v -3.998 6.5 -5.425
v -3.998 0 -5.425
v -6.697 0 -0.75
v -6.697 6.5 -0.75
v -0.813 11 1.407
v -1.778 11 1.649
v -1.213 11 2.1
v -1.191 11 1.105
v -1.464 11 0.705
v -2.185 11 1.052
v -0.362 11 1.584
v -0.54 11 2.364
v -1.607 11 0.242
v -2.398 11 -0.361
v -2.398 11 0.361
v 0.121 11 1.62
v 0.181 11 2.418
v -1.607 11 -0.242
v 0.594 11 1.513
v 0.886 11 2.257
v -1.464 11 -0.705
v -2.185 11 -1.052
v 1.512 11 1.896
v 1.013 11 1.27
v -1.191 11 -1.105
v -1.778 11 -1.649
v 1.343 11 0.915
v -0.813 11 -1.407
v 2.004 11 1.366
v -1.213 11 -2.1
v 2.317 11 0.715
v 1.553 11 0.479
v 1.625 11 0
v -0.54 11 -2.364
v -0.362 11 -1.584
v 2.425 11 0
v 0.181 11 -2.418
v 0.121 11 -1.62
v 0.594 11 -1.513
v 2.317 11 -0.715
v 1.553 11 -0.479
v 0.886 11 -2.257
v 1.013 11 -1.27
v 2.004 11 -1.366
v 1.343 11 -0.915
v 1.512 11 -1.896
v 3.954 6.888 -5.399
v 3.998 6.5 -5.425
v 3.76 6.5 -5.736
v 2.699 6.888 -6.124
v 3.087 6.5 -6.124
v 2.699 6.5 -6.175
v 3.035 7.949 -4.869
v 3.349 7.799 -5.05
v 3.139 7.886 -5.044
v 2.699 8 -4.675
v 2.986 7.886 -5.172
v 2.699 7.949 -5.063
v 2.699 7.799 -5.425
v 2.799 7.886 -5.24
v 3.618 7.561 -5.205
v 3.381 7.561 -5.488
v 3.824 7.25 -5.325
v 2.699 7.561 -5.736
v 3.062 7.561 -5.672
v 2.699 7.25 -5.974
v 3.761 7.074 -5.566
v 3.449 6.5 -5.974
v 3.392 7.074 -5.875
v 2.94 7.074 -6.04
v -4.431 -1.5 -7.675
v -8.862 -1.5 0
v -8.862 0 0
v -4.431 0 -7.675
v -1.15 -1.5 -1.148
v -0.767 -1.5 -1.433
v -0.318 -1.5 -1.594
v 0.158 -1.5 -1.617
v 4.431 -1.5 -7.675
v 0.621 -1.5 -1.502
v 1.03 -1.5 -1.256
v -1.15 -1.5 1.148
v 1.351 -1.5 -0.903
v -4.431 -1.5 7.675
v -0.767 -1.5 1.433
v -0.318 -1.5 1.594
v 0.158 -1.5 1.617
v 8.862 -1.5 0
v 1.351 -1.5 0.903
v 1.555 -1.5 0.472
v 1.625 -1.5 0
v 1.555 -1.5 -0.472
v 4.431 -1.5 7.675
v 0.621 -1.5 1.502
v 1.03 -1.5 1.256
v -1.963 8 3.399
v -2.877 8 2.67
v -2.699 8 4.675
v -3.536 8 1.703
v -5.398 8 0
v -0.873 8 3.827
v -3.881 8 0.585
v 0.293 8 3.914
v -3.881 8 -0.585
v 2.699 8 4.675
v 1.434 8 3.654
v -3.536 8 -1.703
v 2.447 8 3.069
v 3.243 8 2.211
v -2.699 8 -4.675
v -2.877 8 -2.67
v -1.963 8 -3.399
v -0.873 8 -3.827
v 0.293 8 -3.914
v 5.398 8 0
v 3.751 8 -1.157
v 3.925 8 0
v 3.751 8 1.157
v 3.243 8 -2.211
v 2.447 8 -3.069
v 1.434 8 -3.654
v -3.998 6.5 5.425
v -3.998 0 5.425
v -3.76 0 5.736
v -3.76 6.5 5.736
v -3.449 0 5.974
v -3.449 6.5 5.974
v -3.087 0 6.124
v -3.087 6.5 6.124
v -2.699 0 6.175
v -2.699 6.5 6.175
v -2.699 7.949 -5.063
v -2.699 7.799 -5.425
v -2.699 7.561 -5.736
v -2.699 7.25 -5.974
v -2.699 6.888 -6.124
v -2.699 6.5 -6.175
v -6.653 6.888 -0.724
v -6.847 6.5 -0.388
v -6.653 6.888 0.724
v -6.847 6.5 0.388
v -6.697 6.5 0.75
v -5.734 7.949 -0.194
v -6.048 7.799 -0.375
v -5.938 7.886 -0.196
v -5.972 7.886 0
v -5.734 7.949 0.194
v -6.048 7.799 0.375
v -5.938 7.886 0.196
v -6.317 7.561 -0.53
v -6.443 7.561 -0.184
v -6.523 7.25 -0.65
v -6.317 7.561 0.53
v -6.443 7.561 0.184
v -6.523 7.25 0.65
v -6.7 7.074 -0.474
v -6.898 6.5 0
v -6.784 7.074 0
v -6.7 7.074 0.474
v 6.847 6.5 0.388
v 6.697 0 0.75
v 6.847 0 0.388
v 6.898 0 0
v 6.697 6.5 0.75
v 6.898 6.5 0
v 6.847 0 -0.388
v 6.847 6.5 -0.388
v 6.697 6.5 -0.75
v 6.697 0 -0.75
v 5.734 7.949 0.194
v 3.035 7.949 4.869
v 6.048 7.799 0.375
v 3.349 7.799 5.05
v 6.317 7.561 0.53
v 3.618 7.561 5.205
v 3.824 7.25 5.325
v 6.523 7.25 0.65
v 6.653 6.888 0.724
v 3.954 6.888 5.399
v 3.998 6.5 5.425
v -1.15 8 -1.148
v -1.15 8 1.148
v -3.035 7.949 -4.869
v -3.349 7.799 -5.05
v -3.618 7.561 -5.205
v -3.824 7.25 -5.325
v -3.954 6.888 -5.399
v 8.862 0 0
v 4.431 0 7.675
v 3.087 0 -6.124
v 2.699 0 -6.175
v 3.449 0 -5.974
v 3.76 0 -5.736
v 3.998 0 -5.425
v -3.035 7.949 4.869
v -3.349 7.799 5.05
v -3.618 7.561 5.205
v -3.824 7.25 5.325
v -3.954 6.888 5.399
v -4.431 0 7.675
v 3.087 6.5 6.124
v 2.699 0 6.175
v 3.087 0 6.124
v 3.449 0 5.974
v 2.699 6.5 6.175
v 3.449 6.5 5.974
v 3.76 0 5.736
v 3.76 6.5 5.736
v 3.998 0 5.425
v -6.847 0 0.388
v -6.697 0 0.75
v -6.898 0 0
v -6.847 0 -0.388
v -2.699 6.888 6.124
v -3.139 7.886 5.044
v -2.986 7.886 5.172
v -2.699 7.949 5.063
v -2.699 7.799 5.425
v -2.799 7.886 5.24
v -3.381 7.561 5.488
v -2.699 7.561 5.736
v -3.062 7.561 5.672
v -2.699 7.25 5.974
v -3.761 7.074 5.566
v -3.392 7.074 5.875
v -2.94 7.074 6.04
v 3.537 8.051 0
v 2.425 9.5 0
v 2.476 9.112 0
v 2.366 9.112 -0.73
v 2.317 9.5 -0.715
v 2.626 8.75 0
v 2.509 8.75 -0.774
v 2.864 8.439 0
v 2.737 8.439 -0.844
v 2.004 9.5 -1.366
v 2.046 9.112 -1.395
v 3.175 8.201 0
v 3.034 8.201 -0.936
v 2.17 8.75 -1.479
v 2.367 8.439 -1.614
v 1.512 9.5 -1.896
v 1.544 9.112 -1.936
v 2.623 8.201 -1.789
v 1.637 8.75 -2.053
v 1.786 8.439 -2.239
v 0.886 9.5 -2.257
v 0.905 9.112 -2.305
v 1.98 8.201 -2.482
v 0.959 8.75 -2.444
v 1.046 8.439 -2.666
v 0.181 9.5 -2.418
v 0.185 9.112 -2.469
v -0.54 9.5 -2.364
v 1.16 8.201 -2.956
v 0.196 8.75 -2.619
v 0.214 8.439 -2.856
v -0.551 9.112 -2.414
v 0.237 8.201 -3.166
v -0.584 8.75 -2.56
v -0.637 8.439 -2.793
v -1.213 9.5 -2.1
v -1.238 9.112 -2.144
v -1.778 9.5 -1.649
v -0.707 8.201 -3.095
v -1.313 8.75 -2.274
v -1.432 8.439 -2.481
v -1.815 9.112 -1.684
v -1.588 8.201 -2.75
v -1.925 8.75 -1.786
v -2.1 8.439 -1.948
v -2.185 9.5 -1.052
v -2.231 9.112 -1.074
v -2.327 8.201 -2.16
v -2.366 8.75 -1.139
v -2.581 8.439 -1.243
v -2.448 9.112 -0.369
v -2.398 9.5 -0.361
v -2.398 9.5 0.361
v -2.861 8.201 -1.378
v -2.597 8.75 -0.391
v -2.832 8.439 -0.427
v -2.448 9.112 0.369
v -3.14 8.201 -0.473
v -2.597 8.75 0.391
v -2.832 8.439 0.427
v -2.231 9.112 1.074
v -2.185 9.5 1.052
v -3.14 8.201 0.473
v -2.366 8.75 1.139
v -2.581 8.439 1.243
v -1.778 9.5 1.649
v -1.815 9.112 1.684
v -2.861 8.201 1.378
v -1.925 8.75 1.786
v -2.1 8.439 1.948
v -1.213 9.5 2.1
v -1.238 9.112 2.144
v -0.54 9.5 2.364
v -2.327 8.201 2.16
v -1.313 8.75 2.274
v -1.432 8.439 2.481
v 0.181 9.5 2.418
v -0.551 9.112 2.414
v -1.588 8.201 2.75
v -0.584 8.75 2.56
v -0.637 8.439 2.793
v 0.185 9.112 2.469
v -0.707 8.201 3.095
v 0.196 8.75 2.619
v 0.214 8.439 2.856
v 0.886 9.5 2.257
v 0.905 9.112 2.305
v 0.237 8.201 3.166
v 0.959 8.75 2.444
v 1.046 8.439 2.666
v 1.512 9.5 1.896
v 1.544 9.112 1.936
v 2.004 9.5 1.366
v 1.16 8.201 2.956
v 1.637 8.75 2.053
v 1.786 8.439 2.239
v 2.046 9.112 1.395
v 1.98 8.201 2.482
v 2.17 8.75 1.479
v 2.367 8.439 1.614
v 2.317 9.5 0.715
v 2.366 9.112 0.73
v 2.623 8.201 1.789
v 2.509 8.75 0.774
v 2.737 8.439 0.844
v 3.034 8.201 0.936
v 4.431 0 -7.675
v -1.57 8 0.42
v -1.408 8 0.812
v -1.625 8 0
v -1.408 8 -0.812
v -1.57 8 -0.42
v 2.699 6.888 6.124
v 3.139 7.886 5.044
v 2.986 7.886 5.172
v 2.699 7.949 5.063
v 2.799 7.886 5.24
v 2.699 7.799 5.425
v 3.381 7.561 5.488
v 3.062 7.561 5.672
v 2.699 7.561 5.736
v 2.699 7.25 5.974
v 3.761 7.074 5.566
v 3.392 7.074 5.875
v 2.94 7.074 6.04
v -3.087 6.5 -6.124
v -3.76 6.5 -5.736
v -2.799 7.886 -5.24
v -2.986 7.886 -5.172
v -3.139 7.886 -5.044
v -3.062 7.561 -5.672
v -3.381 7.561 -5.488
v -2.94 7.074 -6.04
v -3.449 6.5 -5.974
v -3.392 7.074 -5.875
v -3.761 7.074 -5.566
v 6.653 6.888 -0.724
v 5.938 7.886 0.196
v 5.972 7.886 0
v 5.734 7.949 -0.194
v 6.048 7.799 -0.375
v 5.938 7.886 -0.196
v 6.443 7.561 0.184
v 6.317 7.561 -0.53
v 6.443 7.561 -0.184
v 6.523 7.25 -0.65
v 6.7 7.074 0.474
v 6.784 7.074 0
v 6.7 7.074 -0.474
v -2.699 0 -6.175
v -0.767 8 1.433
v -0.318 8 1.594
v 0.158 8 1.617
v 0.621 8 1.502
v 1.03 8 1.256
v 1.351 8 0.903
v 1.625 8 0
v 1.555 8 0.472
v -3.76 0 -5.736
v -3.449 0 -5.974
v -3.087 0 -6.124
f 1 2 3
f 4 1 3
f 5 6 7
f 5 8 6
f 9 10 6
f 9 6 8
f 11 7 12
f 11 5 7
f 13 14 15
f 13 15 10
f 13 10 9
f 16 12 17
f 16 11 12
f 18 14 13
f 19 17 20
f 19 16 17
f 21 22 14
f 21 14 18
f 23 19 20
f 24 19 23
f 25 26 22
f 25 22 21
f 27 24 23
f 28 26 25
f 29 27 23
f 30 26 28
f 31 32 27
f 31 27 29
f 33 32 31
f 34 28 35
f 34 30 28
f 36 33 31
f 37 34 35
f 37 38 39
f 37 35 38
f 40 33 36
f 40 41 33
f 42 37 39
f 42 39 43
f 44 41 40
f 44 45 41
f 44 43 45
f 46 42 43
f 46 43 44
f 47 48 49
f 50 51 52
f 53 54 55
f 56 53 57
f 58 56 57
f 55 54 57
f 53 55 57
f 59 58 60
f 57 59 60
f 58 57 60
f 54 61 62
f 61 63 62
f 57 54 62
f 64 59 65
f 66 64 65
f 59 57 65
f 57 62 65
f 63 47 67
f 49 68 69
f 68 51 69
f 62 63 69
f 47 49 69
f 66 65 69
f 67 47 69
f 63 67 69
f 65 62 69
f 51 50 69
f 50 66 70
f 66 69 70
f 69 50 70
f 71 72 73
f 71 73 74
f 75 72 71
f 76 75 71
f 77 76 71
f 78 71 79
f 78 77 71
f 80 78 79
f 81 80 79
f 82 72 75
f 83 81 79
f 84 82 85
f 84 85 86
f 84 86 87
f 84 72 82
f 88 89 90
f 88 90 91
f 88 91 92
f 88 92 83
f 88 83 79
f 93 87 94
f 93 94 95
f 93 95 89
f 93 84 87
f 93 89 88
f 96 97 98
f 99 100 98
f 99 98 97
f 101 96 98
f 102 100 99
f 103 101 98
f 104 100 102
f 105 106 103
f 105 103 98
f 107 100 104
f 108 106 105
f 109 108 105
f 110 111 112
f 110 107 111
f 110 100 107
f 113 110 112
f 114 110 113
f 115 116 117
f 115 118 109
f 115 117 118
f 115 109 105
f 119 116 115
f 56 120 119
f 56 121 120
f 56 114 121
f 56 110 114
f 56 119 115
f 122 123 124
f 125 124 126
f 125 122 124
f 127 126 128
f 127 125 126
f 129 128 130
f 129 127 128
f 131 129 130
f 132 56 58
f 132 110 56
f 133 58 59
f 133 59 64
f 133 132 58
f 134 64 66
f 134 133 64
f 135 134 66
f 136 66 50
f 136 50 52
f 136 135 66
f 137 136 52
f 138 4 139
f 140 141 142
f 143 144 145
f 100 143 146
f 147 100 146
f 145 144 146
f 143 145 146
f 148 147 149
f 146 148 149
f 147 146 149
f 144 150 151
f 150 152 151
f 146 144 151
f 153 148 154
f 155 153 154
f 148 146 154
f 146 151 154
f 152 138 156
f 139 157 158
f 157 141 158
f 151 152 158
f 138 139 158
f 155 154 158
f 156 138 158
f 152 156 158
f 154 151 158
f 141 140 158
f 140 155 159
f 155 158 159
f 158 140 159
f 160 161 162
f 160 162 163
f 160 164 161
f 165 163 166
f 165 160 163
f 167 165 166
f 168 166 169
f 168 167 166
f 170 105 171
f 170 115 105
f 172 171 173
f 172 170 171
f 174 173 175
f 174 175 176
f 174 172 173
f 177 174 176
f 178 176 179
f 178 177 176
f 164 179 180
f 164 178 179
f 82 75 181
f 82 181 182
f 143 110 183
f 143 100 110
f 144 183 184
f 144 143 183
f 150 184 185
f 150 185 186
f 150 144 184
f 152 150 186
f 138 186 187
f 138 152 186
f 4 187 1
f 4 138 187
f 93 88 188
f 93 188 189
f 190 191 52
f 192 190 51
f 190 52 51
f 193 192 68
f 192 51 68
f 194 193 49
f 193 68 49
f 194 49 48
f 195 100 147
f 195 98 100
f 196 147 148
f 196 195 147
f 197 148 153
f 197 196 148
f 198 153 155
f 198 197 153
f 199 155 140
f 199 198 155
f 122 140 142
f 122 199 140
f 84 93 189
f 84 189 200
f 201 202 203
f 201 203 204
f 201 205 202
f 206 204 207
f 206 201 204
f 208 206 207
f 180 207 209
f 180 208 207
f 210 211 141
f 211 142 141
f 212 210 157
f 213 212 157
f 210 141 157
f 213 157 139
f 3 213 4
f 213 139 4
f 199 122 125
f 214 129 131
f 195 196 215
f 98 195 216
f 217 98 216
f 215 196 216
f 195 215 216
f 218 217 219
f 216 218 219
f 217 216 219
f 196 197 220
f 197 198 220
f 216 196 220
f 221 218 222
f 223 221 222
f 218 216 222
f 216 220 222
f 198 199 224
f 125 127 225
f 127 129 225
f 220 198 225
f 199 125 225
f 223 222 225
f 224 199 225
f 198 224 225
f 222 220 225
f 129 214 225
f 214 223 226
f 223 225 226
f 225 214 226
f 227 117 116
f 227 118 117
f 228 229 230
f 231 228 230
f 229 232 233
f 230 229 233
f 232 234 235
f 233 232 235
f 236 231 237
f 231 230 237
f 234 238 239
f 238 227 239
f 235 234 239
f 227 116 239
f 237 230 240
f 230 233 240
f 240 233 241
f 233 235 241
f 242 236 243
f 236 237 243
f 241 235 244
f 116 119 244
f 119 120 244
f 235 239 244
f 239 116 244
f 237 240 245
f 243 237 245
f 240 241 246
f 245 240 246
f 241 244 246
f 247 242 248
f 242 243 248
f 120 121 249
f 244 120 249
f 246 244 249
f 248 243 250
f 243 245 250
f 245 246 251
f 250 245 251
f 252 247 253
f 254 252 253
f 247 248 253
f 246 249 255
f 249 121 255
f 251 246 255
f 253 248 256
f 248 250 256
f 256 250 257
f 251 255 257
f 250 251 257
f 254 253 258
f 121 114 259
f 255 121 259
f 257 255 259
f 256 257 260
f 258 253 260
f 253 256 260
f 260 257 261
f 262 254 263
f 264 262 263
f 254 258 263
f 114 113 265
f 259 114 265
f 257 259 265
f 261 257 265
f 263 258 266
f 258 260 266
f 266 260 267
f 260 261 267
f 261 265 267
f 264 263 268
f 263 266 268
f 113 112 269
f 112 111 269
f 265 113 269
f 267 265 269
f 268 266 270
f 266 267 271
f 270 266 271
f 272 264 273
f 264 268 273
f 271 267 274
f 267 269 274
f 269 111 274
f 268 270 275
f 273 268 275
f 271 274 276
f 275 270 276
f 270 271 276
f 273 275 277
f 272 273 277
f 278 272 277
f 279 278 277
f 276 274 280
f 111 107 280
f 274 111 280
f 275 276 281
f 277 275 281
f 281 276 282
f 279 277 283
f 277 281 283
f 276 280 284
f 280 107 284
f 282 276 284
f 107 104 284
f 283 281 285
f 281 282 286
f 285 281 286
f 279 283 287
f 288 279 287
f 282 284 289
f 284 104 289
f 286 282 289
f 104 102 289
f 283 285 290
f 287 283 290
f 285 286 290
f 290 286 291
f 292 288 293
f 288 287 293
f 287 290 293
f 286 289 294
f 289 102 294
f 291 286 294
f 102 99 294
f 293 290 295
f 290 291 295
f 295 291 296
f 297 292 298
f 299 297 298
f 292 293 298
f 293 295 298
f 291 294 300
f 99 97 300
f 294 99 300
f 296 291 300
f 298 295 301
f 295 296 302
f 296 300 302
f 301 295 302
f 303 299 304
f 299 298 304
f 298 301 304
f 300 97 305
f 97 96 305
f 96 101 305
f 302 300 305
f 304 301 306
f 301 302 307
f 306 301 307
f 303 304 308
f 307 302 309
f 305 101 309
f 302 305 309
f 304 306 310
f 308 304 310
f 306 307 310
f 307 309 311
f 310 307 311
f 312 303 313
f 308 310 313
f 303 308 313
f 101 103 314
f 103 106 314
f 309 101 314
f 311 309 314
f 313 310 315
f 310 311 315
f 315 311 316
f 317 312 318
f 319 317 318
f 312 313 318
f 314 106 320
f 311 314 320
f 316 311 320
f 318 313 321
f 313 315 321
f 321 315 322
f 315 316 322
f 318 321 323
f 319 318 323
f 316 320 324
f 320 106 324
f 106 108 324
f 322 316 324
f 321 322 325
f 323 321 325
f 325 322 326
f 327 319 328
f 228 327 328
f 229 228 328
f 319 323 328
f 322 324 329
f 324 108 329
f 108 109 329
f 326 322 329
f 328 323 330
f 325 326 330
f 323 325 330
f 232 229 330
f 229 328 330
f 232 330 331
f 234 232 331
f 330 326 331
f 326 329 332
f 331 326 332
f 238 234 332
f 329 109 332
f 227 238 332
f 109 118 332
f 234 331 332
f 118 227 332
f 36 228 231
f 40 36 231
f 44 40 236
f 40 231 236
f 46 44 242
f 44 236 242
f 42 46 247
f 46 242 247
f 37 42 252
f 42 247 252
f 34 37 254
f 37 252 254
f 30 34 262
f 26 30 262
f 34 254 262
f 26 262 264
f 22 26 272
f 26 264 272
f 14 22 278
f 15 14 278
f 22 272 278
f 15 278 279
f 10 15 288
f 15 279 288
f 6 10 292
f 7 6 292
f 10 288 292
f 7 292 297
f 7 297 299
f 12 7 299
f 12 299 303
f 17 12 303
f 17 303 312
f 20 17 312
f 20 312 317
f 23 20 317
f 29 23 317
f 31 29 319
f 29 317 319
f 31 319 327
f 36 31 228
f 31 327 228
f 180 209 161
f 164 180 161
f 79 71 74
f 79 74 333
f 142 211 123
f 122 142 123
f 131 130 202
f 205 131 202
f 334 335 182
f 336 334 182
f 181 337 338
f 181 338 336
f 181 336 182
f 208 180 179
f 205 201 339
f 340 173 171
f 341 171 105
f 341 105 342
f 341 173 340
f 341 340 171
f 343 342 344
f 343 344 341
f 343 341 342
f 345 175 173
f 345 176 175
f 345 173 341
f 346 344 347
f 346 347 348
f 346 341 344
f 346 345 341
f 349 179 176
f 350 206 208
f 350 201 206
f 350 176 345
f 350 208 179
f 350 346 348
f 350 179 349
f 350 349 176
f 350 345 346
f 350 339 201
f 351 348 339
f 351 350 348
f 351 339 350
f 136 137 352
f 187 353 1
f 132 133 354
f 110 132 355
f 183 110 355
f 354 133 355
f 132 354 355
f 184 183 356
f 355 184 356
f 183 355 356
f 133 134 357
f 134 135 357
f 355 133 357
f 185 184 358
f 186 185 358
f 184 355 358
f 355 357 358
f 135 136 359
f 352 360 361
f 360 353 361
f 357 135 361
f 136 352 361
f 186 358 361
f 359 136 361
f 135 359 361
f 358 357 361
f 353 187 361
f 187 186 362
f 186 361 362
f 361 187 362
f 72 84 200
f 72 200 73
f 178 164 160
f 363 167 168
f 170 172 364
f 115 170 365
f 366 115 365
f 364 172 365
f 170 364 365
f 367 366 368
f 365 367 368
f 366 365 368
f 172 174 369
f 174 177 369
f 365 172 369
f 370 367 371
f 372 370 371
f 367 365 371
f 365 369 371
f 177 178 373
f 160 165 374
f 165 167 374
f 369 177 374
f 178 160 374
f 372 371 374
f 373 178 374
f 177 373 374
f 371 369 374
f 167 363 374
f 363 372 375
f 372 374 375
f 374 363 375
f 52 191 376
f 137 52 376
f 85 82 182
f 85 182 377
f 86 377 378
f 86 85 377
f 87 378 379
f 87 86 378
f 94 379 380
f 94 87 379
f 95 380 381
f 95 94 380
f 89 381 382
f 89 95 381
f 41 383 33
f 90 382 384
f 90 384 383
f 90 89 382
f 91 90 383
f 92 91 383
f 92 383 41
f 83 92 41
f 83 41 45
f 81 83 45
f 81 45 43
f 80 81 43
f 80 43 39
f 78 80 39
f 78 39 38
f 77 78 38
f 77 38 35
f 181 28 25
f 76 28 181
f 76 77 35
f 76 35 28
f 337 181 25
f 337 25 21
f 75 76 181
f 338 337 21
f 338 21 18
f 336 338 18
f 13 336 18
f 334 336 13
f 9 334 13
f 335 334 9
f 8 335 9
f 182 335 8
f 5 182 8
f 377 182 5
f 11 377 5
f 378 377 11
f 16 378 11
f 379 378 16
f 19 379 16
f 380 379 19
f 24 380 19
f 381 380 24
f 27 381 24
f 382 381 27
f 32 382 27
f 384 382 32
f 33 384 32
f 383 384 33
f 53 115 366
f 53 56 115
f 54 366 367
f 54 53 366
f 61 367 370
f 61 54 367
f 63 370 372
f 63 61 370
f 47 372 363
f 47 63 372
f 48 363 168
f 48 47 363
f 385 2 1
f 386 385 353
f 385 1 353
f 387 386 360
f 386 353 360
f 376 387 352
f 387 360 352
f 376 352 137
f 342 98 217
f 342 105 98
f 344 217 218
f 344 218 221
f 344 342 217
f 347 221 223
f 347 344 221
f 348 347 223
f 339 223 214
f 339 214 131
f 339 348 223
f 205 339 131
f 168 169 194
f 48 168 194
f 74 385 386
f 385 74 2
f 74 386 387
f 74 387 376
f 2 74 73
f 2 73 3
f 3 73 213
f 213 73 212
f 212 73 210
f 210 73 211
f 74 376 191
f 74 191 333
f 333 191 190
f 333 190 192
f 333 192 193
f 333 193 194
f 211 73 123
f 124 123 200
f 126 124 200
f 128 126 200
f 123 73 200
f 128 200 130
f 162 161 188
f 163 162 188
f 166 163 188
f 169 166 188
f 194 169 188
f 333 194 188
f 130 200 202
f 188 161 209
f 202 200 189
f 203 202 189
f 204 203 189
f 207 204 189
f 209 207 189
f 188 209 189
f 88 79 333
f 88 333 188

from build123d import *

# Parameters (mm, degrees)
BOSS_EXTRUDE1_DEPTH = 8
BOSS_EXTRUDE2_START = 1.5
BOSS_EXTRUDE2_DEPTH = 1.5
SKETCH4_R           = 2.425
SKETCH4_R_2         = 1.625
EXTRUDE_THIN1_DEPTH = 3
FILLET1_R           = 1.5


with BuildPart() as part:
    # Sketch1 → Boss-Extrude1 (new body)
    with BuildSketch(Plane(origin=(0, 0, 0), x_dir=(1, 0, 0), z_dir=(0, 1, 0))):
        Polygon((-7.130275824, 0), (-3.565137912, -6.175), (3.565137912, -6.175), (7.130275824, 0), (3.565137912, 6.175), (-3.565137912, 6.175), align=None)
        with BuildLine():
            Line((-1.15, 1.14809625), (-1.15, -1.14809625))
            ThreePointArc((-1.15, -1.14809625), (1.625, 0), (-1.15, 1.14809625))
        make_face(mode=Mode.SUBTRACT)
    extrude(amount=BOSS_EXTRUDE1_DEPTH)

    # Sketch2 → Boss-Extrude2 (add)
    with BuildSketch(Plane.XZ.offset(BOSS_EXTRUDE2_START)):
        Polygon((-4.431163316, 7.675), (-8.862326632, 0), (-4.431163316, -7.675), (4.431163316, -7.675), (8.862326632, 0), (4.431163316, 7.675), align=None)
        with BuildLine():
            Line((-1.15, -1.14809625), (-1.15, 1.14809625))
            ThreePointArc((-1.15, 1.14809625), (1.625, 0), (-1.15, -1.14809625))
        make_face(mode=Mode.SUBTRACT)
    extrude(amount=-BOSS_EXTRUDE2_DEPTH)

    # Sketch4 → Extrude-Thin1 (add)
    with BuildSketch(Plane(origin=(0, 8, 0), x_dir=(1, 0, 0), z_dir=(0, 1, 0))):
        Circle(SKETCH4_R)
        Circle(SKETCH4_R_2, mode=Mode.SUBTRACT)
    extrude(amount=EXTRUDE_THIN1_DEPTH)

    # Fillet1
    fillet1_edges = [part.edges().sort_by_distance(p)[0] for p in [
        (0, 8, 6.175),
        (-3.565137912, 4, -6.175),
        (3.565137912, 4, -6.175),
        (7.130275824, 4, 0),
        (3.565137912, 4, 6.175),
        (-3.565137912, 4, 6.175),
        (-7.130275824, 4, 0),
        (5.347706868, 8, 3.0875),
        (5.347706868, 8, -3.0875),
        (0, 8, -6.175),
        (-5.347706868, 8, -3.0875),
        (-2.425, 8, 0),
        (-5.347706868, 8, 3.0875),
    ]]
    fillet(fillet1_edges, radius=FILLET1_R)


solid = part.part
